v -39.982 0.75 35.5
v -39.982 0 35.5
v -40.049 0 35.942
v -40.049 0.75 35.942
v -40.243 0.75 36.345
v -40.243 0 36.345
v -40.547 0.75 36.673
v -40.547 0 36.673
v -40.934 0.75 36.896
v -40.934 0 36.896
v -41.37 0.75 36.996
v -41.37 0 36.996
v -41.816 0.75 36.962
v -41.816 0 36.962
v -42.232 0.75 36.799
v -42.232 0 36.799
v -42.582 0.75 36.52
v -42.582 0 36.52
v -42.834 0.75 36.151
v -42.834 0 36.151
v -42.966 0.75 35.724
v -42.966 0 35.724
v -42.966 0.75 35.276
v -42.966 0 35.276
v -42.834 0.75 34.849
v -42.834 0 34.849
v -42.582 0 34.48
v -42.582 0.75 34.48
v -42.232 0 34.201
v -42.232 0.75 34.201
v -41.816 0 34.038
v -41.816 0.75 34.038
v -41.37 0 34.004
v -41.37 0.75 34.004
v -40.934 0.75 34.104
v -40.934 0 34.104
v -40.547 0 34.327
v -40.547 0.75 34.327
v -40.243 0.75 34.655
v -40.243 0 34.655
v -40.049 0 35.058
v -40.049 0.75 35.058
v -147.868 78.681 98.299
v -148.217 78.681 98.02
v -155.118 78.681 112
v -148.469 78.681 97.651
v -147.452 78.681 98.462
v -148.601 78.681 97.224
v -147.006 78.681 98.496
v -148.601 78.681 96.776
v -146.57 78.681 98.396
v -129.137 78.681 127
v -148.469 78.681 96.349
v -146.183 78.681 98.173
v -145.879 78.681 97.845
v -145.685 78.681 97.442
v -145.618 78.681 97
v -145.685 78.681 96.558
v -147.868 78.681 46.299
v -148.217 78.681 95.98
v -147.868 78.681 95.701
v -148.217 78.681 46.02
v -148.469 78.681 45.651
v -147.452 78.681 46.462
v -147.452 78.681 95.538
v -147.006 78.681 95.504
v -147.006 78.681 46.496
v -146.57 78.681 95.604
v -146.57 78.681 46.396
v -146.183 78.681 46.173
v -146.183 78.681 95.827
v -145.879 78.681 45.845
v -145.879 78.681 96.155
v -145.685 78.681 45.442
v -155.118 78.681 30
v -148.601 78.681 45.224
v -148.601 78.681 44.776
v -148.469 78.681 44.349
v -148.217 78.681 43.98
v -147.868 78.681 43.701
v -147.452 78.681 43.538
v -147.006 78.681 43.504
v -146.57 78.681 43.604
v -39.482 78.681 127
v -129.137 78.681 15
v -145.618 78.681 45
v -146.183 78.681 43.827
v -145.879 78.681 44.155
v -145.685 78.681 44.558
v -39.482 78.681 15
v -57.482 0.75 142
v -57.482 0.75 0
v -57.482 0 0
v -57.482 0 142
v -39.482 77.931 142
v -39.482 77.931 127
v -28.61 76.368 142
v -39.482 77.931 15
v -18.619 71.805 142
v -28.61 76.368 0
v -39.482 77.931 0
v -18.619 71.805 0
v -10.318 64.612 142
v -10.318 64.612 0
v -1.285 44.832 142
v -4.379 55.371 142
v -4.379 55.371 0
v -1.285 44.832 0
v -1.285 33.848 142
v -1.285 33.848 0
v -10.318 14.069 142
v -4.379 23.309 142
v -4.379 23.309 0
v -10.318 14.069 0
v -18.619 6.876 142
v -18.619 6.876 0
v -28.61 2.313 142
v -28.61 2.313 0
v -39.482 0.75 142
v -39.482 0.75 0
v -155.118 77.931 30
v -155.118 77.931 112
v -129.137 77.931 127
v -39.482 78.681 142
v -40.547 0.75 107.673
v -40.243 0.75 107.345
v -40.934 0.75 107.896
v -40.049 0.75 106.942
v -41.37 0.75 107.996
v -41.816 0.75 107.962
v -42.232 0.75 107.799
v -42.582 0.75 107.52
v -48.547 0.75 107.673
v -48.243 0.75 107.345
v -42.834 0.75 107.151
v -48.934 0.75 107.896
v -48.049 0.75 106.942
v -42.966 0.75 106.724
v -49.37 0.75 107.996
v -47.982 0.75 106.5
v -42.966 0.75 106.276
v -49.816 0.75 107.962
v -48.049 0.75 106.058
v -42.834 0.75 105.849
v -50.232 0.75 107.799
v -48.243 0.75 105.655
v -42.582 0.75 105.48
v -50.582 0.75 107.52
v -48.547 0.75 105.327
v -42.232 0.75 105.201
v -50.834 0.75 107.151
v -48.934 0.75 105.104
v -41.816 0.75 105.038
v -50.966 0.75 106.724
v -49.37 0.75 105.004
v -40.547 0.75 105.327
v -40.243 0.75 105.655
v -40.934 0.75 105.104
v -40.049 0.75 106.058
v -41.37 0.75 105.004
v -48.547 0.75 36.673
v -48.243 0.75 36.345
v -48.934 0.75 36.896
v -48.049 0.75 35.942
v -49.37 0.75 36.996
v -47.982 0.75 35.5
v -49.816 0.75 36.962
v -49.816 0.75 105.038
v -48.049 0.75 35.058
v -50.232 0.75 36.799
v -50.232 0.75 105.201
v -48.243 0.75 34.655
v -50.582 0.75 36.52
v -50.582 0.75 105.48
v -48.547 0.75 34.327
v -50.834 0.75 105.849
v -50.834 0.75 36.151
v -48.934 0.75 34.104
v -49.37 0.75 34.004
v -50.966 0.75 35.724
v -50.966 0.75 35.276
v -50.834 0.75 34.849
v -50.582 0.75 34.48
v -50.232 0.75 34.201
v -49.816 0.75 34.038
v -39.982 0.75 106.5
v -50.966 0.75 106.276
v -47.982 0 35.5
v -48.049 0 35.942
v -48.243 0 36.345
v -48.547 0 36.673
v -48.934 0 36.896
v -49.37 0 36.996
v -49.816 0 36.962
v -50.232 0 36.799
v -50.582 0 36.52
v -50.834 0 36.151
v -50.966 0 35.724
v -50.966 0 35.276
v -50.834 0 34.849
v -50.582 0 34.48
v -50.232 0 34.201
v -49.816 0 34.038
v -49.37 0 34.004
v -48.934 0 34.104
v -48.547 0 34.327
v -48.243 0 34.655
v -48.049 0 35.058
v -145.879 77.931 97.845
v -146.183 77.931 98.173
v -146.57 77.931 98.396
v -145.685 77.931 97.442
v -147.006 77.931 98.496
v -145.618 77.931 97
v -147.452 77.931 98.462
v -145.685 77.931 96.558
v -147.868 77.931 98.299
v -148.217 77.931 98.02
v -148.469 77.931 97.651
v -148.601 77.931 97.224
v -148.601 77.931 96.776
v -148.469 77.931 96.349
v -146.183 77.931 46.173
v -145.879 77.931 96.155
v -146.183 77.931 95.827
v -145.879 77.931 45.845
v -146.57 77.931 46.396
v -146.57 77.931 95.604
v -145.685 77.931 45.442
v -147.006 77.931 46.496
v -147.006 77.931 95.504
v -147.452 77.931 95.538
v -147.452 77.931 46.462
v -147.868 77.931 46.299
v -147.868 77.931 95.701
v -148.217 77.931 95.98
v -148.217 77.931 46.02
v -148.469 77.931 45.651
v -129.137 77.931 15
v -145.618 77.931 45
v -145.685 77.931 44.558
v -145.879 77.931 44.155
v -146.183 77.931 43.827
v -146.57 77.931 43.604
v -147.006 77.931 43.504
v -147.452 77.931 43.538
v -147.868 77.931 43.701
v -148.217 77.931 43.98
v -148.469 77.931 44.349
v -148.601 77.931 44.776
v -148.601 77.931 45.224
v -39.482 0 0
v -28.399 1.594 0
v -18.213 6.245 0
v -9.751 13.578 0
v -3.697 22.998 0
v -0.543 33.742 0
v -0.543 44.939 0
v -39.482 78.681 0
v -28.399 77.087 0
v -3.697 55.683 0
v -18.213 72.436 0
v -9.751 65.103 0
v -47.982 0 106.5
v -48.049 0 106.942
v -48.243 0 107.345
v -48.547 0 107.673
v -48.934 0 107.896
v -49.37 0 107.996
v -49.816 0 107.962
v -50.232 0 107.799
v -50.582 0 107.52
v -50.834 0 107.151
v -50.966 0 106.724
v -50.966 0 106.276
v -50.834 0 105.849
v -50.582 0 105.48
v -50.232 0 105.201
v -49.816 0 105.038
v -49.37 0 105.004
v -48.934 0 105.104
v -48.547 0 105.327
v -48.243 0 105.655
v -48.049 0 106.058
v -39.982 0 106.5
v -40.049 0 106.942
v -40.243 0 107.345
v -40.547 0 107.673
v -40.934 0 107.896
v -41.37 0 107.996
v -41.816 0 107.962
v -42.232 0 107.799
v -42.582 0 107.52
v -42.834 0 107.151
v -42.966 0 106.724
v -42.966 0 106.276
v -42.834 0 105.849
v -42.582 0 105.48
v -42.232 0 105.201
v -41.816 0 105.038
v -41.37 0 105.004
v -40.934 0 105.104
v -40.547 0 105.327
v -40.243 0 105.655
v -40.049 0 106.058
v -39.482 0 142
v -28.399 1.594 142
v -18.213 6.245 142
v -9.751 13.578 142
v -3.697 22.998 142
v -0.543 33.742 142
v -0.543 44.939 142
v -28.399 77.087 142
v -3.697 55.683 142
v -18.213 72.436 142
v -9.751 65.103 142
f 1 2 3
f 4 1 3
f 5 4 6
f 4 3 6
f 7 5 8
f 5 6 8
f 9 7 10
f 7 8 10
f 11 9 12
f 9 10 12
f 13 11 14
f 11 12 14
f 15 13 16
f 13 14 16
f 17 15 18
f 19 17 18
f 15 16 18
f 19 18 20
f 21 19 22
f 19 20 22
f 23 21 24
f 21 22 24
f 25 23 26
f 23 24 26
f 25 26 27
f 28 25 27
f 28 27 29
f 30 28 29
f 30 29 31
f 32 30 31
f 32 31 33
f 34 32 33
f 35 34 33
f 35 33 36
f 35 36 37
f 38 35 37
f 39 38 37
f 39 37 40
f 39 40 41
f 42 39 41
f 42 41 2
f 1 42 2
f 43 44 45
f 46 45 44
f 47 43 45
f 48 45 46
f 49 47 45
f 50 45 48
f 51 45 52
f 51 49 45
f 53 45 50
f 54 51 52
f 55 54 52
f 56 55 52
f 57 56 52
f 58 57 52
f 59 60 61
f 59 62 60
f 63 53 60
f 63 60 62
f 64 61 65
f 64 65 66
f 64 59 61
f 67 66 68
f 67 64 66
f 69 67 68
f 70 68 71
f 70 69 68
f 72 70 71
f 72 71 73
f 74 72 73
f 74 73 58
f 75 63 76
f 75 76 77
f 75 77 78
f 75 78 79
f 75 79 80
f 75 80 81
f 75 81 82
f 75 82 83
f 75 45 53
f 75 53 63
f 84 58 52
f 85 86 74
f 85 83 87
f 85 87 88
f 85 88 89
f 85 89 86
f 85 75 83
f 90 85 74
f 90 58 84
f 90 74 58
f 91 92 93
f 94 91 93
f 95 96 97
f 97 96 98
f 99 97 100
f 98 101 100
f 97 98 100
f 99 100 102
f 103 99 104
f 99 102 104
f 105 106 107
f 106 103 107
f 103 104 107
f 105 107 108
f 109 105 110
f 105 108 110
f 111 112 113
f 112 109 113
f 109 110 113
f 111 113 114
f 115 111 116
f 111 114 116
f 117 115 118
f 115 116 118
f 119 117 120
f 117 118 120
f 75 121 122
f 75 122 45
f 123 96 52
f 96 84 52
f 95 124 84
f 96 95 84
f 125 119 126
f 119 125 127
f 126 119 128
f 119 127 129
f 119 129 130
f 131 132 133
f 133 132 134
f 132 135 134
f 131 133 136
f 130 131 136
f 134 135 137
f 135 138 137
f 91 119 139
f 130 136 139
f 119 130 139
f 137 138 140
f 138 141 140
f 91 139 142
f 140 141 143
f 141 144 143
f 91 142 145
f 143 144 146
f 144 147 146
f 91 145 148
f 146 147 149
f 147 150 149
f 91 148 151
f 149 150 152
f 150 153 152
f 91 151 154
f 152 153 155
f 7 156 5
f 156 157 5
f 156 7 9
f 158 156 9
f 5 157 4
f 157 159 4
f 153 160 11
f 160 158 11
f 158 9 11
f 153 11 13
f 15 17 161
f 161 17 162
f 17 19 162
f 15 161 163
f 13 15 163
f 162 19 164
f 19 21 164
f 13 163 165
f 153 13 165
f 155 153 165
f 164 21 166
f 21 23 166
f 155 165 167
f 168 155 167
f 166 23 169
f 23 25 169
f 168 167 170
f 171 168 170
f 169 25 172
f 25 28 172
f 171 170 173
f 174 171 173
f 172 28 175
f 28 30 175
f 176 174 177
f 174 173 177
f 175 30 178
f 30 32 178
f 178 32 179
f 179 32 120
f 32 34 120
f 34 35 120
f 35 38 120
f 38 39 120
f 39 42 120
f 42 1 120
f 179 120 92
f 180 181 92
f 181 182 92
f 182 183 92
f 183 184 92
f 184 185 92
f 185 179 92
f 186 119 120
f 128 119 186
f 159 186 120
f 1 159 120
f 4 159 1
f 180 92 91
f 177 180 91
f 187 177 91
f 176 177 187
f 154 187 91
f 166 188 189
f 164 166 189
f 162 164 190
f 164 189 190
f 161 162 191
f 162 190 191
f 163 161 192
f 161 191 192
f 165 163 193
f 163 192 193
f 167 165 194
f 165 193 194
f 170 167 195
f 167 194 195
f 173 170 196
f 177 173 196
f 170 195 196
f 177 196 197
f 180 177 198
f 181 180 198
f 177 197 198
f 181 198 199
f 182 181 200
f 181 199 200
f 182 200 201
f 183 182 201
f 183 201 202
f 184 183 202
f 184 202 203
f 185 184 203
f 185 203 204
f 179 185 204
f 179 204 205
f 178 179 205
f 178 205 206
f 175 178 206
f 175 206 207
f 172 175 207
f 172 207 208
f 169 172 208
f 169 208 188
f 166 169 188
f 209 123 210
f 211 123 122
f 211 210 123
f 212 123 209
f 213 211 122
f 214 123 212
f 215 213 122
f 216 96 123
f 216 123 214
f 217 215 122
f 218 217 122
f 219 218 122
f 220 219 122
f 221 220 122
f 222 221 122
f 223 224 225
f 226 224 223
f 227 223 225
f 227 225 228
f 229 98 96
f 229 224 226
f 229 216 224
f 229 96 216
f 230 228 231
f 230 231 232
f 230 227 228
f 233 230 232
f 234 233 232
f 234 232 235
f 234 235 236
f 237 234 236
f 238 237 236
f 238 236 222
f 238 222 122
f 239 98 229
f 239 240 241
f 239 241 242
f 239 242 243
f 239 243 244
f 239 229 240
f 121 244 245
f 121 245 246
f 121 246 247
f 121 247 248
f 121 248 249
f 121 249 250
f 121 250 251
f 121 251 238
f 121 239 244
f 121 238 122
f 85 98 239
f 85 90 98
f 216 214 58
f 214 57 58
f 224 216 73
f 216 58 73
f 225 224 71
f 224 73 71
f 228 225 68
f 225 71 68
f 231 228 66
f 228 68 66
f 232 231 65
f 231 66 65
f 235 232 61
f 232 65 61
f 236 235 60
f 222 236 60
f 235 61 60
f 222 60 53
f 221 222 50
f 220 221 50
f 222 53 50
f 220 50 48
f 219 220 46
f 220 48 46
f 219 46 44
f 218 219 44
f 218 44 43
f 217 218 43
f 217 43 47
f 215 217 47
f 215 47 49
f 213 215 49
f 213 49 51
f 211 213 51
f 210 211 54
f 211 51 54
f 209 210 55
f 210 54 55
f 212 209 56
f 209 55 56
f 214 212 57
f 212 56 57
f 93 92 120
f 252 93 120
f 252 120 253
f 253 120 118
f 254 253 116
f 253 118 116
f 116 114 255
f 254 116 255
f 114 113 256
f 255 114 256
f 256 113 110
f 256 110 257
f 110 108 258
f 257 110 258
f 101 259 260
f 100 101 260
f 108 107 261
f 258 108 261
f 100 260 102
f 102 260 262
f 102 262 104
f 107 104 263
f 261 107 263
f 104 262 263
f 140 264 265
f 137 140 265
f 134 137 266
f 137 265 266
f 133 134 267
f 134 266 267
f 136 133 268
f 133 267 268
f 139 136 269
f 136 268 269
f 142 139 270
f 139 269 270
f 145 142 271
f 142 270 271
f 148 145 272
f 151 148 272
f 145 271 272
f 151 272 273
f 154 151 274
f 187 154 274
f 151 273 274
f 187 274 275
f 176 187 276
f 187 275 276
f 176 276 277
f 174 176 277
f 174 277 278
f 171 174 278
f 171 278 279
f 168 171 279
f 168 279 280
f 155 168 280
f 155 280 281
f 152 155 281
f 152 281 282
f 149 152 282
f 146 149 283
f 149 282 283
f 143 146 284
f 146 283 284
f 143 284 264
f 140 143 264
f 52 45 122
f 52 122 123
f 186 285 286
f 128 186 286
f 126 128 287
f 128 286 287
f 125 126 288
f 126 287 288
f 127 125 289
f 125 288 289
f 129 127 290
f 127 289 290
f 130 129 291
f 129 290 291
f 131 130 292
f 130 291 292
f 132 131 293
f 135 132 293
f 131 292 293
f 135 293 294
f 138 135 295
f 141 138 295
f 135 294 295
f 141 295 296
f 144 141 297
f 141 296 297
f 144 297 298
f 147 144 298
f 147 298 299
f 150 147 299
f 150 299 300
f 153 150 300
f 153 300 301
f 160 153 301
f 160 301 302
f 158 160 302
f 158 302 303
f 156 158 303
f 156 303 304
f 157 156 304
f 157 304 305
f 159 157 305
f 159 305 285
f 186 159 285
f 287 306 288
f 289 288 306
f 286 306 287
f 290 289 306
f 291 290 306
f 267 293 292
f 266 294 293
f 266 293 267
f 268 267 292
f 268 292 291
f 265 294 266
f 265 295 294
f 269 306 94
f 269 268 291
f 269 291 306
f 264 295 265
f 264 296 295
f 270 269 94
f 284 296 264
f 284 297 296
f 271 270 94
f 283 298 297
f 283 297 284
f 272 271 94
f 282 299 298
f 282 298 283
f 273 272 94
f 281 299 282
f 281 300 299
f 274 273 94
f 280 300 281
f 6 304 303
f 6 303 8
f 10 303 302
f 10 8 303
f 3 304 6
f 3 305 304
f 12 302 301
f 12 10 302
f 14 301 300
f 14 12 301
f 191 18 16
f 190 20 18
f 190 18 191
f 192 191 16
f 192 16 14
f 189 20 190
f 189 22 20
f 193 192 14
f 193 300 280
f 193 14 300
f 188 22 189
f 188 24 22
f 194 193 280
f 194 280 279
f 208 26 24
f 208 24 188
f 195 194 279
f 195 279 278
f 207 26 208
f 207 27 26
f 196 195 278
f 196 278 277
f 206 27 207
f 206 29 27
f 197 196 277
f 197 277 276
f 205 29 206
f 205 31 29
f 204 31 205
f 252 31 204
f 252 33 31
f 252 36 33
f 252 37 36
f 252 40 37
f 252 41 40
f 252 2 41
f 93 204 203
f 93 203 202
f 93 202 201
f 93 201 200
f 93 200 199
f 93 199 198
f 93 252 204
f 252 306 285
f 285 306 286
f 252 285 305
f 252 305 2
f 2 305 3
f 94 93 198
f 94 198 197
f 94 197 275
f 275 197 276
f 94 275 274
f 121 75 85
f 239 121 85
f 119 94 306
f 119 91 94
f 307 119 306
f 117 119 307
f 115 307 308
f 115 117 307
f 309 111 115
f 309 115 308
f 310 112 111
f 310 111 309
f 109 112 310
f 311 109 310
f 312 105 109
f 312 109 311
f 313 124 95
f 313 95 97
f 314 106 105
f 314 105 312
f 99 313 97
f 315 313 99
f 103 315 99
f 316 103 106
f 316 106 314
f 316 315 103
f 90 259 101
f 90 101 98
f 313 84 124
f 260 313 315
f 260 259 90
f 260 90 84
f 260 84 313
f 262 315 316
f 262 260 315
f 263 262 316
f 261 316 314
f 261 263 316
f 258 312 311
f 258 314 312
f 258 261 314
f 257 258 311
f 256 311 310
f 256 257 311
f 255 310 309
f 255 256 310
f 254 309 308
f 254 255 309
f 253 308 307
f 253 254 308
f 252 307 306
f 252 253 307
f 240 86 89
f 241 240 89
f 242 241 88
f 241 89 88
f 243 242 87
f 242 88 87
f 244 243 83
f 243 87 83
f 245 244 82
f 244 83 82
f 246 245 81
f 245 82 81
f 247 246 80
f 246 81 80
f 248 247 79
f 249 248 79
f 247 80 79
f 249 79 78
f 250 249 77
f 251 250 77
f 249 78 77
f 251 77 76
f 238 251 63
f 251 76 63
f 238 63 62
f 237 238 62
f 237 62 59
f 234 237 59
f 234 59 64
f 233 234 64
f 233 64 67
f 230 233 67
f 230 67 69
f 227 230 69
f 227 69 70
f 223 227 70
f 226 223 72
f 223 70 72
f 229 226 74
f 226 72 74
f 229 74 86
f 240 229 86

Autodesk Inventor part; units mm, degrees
ref_plane "YZ Plane" through (0, 0, 0) normal (1, 0, 0) x (0, 1, 0)
ref_plane "XZ Plane" through (0, 0, 0) normal (0, 1, 0) x (-1, 0, 0)
ref_plane "XY Plane" through (0, 0, 0) normal (0, 0, 1) x (1, 0, 0)
sketch "スケッチ1" plane through (0, 0, 0) normal (0, 0, 1) x (1, 0, 0)
  line L0 (44.9825, 3) -> (44.9825, 0)
  line L1 (44.9825, 0) -> (93.5151, 0)
  line L2 (44.9825, 3) -> (93.5151, 3)
  circle A0 centre (152.1179, -73.6808) radius 5
  circle A1 centre (90.7937, -5.925) radius 3
  circle A2 centre (91.5613, -41.579) radius 3
  line L3 (50.9825, 0) -> (47.9825, 0)
  line L4 (47.9825, 0.7) -> (50.9825, 0.7)
  line L5 (-44.9825, -3) -> (-44.9825, 0)
  line L6 (-44.9825, 0) -> (-93.5151, 0)
  line L7 (-44.9825, -3) -> (-93.5151, -3)
  circle A3 centre (-152.1179, 73.6808) radius 5
  circle A4 centre (-90.7937, 5.925) radius 3
  circle A5 centre (-91.5613, 41.579) radius 3
  line L8 (-50.9825, 0) -> (-47.9825, 0)
  line L9 (-47.9825, -0.7) -> (-50.9825, -0.7)
  arc A6 (-39.4825, 0) -> (-39.4825, 78.6808) centre (-39.4825, 39.3404) ccw
  line L10 (-152.1179, 78.6808) -> (-39.4825, 78.6808)
  line L11 (-39.4825, 0) -> (-57.4825, 0)
  line L12 (-147.1179, 78.6808) -> (-147.1179, 73.6808)
  line L13 (-152.1179, 78.6808) -> (-155.1179, 78.6808)
  arc A7 (-39.4825, 0.75) -> (-39.4825, 77.9308) centre (-39.4825, 39.3404) ccw
  line L14 (-39.4825, 0.75) -> (-57.4825, 0.75)
  line L15 (-152.1179, 77.9308) -> (-155.1179, 77.9308)
  line L16 (-39.4825, 77.9308) -> (-152.1179, 77.9308)
  line L17 (-57.4825, 0.75) -> (-57.4825, 0)
  line L18 (-155.1179, 77.9308) -> (-155.1179, 78.6808)
  point P0 (0, 0)
  point P1 (49.4825, 0.7)
  point P2 (-49.4825, -0.7)
  point P3 (0, 0)
  point P4 (-153.6179, 78.6808)
  dimension "d2" = 360
  dimension "d4" = 18
  dimension "d5" = 8
  dimension "d6" = 5
  dimension "d7" = 3
  dimension "d8" = 0.75
  dimension "d42" = 10
extrude "押し出し1" add sketch "スケッチ1" along normal blind 142 contours L6 L17 L14 A7 L16 L12 L10 A6 L11 | L12 L16 A3 L10 | A3 L16 L15 | A3 L15 L18 L13 picked at (-153.5984, 78.0681)
sketch "スケッチ2" plane through (-155.1179, 78.6808, 0) normal (0, 1, 0) x (1, 0, 0)
  line L0 (0, 0) -> (0, -142) projected
  line L1 (115.6354, 0) -> (0, 0) projected
  line L2 (115.6354, -142) -> (0, -142) projected
  line L3 (8, 0) -> (8, -142)
  circle A0 centre (8, -45) radius 1.5
  circle A1 centre (8, -97) radius 1.5
  line L4 (37.6032, 0) -> (72.6032, 0) construction
  line L5 (0, 0) -> (115.6354, 0)
  line L6 (115.6354, 0) -> (115.6354, -15)
  line L7 (115.6354, -15) -> (0, -15)
  line L8 (0, -15) -> (0, 0)
  line L9 (0, -142) -> (115.6354, -142)
  line L10 (115.6354, -142) -> (115.6354, -127)
  line L11 (115.6354, -127) -> (0, -127)
  line L12 (0, -127) -> (0, -142)
  line L13 (115.6354, 0) -> (0, 0) projected
  line L14 (0, 0) -> (0, -142) projected
  line L15 (115.6354, -142) -> (0, -142) projected
  line L16 (115.6354, 0) -> (115.6354, -142) projected
  line L17 (0, -15) -> (8, -15)
  line L18 (115.6354, 0) -> (115.6354, -142) projected
  line L19 (0, -30) -> (51.9615, 0)
  line L20 (0, -112) -> (51.9615, -142)
  point P0 (155.1179, 0)
  point P1 (8, -30)
  point P2 (84.9628, 0)
  point P3 (0, -127)
  point P4 (107.627, -142)
  point P5 (0, -19.9913)
  point P6 (25.9808, -127)
  point P7 (25.9808, -15)
  dimension "d12" = 8
  dimension "d13" = 3
  dimension "d14" = 45
  dimension "d15" = 3
  dimension "d16" = 45
  dimension "d28" = 115.6354
  dimension "d29" = 15
  dimension "d30" = 115.6354
  dimension "d31" = 15
  dimension "d32" = 15
  dimension "d33" = 115.6354
  dimension "d34" = 15
  dimension "d35" = 115.6354
  dimension "d36" = 60
  dimension "d37" = 30
  dimension "d38" = 30
  dimension "d39" = 30
extrude "押し出し2" cut sketch "スケッチ2" against normal blind 0.75 contours L1 L3 L7 L0 | L7 L3 L19 L0 | L1 L19 L7 L3 | L7 L19 L3 | L1 L6 L7 L19 | L20 L3 L11 L0 | L11 L3 L2 L0 | L20 L11 L3 | A0 L3 | L3 A0 | L11 L20 L2 L3 | A1 L3 | L3 A1 | L11 L10 L2 L20
sketch "スケッチ4" plane through (-57.4825, 0, 0) normal (0, -1, 0) x (1, 0, 0)
  line L0 (0, 0) -> (18, 0) projected
  line L1 (18, 0) -> (18, 142) projected
  line L2 (0, 142) -> (18, 142) projected
  line L3 (0, 0) -> (0, 142) projected
  line L4 (8, 142) -> (8, 0)
  circle A0 centre (8, 106.5) radius 1.5
  circle A1 centre (16, 106.5) radius 1.5
  line L5 (0, 71) -> (18, 71)
  line L6 (0, 142) -> (18, 142) projected
  circle A2 centre (8, 35.5) radius 1.5
  circle A3 centre (16, 35.5) radius 1.5
  line L7 (8, 106.5) -> (16, 106.5)
  point P0 (57.4825, 0)
  dimension "d43" = 8
  dimension "d44" = 3
  dimension "d45" = 35.5
  dimension "d46" = 3
  dimension "d47" = 8
  dimension "d48" = 71
  dimension "d51" = 71
extrude "押し出し4" cut sketch "スケッチ4" against normal blind 0.75 contours A2 L4 | L4 A2 | A1 | A0 L4 | L4 L7 A0 | A0 L7 L4 | A3
equation "\"d32\" = d29"
equation "\"d33\" = d28"
equation "\"d34\" = d31"
equation "\"d35\" = d30"
properties part number "回路BOX背面" material "ポリプロピレン"
